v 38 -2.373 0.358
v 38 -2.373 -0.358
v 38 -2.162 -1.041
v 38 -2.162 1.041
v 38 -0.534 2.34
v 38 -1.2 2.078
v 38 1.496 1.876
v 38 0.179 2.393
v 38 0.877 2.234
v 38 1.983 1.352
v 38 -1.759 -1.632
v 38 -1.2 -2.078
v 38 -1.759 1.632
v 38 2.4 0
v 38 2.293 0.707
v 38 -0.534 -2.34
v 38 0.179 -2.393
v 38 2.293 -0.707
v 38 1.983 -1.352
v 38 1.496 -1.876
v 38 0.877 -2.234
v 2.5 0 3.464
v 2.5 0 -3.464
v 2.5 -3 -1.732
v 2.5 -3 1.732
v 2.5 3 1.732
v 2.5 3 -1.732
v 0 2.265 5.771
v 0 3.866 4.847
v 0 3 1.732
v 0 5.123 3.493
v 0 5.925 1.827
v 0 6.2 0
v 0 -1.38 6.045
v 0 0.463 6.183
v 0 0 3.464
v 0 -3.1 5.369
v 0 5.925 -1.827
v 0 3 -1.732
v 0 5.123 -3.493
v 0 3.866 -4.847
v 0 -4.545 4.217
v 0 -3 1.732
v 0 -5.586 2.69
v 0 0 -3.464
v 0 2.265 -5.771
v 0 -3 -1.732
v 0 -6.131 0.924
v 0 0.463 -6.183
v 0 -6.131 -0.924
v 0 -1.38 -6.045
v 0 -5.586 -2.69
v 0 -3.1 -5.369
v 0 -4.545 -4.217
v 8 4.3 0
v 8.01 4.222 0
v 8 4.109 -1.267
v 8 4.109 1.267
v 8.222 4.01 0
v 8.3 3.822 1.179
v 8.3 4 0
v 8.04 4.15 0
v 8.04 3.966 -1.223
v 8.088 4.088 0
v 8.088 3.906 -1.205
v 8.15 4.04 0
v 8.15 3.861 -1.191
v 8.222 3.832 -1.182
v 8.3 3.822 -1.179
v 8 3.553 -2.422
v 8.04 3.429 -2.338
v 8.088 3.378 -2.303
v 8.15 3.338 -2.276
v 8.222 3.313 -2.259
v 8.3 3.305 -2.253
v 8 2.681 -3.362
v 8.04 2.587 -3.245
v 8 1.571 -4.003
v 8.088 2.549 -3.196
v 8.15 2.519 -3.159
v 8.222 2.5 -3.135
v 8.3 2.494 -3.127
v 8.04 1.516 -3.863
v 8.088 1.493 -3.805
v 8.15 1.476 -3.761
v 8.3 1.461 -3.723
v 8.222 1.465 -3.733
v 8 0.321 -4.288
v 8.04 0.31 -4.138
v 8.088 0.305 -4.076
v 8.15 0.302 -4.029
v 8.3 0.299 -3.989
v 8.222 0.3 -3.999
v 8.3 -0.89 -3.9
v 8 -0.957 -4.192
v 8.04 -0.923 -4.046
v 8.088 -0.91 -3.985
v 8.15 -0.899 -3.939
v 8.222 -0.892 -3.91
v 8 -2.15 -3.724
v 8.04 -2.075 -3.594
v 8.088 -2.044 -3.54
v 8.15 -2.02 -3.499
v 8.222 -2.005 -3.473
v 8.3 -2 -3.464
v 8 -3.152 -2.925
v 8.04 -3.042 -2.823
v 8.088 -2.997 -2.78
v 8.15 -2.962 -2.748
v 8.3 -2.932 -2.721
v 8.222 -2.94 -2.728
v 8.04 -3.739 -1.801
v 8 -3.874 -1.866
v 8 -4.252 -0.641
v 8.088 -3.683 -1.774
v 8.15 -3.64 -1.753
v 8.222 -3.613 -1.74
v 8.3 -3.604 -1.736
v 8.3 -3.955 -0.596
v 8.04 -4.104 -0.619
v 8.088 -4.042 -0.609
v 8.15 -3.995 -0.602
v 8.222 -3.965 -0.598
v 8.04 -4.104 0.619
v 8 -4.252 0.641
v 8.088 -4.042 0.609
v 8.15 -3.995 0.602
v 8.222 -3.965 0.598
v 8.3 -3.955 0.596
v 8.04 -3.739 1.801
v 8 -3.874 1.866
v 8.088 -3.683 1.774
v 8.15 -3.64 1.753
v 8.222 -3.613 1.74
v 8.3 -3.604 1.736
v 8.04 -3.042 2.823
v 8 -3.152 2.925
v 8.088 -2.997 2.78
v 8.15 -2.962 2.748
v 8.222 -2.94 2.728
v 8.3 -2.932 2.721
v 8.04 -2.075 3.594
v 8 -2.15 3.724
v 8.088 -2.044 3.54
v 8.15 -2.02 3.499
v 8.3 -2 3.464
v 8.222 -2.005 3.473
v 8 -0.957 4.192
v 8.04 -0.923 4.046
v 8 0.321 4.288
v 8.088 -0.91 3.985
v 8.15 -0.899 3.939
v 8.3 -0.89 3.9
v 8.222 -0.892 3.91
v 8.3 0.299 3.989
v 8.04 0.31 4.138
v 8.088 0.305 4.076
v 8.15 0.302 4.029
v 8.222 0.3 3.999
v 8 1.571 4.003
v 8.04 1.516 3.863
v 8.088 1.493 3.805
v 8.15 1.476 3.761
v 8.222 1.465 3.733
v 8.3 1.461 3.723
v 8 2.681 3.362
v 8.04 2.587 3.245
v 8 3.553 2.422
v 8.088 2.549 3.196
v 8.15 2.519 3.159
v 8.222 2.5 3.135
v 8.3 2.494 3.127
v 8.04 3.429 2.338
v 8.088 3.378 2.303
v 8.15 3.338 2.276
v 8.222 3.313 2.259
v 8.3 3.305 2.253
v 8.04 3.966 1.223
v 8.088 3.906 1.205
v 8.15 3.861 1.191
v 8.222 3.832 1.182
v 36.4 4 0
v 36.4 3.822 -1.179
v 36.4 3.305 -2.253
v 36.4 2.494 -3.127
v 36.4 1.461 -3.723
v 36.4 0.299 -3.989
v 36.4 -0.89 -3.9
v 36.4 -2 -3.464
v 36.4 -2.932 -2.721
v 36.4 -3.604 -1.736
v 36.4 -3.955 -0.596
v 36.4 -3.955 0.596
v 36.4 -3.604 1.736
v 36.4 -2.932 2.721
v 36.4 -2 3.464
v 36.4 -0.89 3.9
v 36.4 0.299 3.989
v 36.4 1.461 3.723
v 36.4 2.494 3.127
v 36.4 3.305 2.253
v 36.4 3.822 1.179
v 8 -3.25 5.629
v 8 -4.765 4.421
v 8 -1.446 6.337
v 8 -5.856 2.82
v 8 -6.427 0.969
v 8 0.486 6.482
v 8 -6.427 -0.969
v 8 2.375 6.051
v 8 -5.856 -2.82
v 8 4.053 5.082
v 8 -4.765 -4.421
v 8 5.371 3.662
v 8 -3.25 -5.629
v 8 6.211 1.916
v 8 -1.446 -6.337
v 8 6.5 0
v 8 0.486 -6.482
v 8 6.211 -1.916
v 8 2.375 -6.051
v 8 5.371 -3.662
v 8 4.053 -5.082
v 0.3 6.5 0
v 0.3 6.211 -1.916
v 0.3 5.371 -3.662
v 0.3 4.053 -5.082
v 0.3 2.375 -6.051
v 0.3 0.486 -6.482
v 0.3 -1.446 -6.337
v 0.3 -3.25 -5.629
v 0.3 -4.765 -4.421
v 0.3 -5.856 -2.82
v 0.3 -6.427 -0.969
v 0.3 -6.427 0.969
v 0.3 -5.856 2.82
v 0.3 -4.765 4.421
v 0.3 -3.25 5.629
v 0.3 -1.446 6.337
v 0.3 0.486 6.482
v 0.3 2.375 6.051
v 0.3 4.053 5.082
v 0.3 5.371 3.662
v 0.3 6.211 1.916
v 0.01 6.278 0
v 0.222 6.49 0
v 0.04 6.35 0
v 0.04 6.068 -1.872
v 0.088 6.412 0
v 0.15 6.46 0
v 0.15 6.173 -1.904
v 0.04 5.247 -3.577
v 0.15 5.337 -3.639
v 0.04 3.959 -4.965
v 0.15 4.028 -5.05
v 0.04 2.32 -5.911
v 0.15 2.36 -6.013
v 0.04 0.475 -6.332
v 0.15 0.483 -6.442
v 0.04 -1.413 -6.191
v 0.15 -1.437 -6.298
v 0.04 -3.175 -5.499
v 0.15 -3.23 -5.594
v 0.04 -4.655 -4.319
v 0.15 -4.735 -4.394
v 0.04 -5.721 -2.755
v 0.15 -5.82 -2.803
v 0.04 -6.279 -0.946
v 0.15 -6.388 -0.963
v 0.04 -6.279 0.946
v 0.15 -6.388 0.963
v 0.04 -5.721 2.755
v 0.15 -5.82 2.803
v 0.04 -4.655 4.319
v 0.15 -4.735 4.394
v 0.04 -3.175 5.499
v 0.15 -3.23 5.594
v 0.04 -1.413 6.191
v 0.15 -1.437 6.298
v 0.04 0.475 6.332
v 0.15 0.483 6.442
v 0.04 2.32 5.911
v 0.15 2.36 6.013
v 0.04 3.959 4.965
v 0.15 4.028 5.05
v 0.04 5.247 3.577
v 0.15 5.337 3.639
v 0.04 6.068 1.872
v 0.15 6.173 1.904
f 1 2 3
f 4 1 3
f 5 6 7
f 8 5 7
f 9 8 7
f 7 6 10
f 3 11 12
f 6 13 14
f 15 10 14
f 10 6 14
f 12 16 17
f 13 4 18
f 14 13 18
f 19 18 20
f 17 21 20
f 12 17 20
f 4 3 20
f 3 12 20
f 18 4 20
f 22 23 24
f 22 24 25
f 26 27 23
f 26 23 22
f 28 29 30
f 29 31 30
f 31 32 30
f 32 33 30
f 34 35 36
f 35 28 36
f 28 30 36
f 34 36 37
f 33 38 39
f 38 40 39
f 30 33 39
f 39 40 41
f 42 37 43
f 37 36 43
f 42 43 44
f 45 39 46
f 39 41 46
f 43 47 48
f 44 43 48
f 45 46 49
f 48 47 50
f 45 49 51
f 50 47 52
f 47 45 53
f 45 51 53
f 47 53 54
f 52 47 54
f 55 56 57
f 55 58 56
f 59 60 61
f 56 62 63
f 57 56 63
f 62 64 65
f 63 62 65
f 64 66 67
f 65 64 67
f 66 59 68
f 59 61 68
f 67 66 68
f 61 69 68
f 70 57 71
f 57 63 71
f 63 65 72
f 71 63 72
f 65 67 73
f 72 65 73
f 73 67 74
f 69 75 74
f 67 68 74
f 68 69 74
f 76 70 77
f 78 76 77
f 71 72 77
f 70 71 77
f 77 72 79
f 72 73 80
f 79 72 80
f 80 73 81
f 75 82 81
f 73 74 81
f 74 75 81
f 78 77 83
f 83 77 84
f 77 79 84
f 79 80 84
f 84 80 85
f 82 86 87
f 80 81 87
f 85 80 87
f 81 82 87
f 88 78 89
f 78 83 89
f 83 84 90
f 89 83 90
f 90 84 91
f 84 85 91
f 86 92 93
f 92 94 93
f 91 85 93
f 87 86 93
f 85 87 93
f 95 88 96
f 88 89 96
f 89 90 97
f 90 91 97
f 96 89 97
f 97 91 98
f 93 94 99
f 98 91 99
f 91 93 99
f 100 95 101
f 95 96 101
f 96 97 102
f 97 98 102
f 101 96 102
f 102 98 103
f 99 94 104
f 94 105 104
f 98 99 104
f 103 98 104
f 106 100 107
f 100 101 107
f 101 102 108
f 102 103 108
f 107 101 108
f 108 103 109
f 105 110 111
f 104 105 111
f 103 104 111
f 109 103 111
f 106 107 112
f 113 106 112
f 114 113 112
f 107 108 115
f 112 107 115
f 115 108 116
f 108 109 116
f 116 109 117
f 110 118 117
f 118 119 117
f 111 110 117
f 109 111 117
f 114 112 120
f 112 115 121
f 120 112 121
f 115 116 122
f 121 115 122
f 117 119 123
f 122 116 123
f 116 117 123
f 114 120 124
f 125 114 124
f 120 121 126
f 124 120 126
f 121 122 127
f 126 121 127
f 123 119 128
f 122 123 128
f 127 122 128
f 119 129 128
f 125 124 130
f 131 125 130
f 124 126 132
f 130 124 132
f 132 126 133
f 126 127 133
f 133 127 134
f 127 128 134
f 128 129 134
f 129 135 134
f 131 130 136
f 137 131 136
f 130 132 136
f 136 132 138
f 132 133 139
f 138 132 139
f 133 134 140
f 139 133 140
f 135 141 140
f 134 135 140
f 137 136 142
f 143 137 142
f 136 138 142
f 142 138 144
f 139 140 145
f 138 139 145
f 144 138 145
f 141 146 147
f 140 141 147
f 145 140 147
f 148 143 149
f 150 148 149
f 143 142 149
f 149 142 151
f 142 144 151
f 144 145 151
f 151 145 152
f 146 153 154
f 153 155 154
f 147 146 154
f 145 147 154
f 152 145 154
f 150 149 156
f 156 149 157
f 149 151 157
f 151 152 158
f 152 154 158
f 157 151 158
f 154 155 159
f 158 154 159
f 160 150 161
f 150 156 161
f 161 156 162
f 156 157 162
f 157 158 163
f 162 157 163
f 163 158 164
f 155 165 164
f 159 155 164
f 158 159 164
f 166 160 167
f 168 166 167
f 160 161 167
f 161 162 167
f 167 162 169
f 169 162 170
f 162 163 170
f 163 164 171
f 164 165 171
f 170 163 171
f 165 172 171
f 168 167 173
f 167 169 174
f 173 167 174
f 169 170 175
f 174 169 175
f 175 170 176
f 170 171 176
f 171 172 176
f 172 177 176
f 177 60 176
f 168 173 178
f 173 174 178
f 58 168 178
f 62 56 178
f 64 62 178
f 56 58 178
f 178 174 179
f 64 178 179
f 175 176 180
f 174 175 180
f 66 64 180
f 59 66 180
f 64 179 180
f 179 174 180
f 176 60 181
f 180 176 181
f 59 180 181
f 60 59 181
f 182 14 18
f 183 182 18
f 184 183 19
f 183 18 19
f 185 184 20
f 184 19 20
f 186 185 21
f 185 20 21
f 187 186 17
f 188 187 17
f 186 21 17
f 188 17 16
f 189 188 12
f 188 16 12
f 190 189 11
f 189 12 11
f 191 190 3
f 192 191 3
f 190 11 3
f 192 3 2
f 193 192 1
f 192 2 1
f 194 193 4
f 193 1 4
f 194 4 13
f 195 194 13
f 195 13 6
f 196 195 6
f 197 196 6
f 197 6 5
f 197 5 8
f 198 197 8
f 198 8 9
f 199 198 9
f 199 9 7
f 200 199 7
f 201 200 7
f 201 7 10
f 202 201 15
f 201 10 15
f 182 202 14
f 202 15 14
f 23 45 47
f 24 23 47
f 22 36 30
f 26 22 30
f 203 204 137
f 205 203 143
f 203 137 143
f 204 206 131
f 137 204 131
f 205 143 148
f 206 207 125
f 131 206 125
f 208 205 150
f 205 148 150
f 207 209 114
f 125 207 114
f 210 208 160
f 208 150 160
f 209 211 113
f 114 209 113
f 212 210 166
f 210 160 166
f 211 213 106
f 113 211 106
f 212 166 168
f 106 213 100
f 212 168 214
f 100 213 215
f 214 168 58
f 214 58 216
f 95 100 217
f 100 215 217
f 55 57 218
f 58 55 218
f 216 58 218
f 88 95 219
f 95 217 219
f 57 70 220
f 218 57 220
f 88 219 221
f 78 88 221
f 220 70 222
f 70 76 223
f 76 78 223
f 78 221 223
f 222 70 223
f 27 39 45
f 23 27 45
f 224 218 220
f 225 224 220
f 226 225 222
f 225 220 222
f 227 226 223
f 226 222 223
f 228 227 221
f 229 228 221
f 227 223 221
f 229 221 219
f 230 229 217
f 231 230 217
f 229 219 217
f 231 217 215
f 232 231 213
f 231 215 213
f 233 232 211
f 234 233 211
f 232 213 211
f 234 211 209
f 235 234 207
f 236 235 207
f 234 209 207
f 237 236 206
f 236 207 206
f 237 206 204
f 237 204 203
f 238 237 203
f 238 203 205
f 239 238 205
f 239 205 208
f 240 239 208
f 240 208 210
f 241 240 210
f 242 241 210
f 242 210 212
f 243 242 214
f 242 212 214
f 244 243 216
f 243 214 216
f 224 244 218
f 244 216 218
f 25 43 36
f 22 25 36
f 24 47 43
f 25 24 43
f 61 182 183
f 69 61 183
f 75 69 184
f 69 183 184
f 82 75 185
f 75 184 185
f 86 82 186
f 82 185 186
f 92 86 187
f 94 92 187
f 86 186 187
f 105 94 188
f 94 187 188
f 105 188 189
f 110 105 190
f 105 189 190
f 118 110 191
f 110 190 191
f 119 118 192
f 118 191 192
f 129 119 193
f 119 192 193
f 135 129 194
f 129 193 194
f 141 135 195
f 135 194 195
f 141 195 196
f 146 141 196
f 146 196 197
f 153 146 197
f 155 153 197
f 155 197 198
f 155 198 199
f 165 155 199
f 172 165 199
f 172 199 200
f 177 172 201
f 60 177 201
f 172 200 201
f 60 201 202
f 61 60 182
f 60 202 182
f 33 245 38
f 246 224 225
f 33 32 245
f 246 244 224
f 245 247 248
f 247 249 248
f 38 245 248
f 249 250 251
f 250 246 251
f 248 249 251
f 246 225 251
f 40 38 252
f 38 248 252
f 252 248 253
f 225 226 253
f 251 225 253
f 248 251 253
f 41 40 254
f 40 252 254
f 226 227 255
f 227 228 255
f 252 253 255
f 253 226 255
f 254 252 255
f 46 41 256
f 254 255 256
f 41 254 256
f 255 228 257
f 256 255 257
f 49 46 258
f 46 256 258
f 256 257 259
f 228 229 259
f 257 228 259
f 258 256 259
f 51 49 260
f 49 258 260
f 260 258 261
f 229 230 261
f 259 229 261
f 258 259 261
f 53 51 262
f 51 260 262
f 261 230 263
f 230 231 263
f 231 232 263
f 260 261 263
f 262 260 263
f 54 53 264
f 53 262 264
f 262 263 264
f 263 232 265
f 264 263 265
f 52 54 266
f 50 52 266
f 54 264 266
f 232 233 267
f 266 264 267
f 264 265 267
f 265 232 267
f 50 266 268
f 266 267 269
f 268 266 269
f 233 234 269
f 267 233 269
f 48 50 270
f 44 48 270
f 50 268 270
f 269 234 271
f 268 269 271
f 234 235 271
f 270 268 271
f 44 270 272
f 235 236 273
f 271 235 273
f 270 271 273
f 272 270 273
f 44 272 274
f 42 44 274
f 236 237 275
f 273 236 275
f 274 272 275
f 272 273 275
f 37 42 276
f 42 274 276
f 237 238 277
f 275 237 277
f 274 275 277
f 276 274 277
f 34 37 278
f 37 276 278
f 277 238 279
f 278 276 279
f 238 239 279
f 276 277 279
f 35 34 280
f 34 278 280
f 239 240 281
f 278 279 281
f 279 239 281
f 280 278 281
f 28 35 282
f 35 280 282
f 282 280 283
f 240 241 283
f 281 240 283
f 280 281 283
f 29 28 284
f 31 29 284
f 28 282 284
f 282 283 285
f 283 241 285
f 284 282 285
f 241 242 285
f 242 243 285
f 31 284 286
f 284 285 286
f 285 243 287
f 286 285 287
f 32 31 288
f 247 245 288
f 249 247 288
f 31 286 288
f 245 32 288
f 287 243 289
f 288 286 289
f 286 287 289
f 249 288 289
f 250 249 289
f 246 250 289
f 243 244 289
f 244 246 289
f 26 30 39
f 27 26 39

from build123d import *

# Parameters (mm, degrees)
CUT_EXTRUDE_1_DEPTH = 2.5
FILLET_1_R          = 0.3
CHAMFER_1_SIZE      = 1.6


with BuildPart() as part:
    # Эскиз1 → Повернуть1 (revolve)
    with BuildSketch(Plane.XY):
        Polygon((0, 0), (0, 6.5), (8, 6.5), (8, 4), (38, 4), (38, 0), align=None)
    revolve(axis=Axis((38, 0, 0), (-1, 0, 0)))

    # Эскиз2 → Вырез-Вытянуть1 (cut)
    with BuildSketch(Plane.ZY):
        Polygon((-1.732050808, 3), (-3.464101615, 0), (-1.732050808, -3), (1.732050808, -3), (3.464101615, 0), (1.732050808, 3), align=None)
    extrude(amount=-CUT_EXTRUDE_1_DEPTH, mode=Mode.SUBTRACT)

    # Скругление1
    fillet_1_edges = [part.edges().sort_by_distance(p)[0] for p in [
        (8, -4, 0),
        (0, -6.5, 0),
    ]]
    fillet(fillet_1_edges, radius=FILLET_1_R)

    # Фаска1
    chamfer_1_edges = [part.edges().sort_by_distance(p)[0] for p in [
        (38, -4, 0),
    ]]
    chamfer(chamfer_1_edges, length=CHAMFER_1_SIZE)


solid = part.part
